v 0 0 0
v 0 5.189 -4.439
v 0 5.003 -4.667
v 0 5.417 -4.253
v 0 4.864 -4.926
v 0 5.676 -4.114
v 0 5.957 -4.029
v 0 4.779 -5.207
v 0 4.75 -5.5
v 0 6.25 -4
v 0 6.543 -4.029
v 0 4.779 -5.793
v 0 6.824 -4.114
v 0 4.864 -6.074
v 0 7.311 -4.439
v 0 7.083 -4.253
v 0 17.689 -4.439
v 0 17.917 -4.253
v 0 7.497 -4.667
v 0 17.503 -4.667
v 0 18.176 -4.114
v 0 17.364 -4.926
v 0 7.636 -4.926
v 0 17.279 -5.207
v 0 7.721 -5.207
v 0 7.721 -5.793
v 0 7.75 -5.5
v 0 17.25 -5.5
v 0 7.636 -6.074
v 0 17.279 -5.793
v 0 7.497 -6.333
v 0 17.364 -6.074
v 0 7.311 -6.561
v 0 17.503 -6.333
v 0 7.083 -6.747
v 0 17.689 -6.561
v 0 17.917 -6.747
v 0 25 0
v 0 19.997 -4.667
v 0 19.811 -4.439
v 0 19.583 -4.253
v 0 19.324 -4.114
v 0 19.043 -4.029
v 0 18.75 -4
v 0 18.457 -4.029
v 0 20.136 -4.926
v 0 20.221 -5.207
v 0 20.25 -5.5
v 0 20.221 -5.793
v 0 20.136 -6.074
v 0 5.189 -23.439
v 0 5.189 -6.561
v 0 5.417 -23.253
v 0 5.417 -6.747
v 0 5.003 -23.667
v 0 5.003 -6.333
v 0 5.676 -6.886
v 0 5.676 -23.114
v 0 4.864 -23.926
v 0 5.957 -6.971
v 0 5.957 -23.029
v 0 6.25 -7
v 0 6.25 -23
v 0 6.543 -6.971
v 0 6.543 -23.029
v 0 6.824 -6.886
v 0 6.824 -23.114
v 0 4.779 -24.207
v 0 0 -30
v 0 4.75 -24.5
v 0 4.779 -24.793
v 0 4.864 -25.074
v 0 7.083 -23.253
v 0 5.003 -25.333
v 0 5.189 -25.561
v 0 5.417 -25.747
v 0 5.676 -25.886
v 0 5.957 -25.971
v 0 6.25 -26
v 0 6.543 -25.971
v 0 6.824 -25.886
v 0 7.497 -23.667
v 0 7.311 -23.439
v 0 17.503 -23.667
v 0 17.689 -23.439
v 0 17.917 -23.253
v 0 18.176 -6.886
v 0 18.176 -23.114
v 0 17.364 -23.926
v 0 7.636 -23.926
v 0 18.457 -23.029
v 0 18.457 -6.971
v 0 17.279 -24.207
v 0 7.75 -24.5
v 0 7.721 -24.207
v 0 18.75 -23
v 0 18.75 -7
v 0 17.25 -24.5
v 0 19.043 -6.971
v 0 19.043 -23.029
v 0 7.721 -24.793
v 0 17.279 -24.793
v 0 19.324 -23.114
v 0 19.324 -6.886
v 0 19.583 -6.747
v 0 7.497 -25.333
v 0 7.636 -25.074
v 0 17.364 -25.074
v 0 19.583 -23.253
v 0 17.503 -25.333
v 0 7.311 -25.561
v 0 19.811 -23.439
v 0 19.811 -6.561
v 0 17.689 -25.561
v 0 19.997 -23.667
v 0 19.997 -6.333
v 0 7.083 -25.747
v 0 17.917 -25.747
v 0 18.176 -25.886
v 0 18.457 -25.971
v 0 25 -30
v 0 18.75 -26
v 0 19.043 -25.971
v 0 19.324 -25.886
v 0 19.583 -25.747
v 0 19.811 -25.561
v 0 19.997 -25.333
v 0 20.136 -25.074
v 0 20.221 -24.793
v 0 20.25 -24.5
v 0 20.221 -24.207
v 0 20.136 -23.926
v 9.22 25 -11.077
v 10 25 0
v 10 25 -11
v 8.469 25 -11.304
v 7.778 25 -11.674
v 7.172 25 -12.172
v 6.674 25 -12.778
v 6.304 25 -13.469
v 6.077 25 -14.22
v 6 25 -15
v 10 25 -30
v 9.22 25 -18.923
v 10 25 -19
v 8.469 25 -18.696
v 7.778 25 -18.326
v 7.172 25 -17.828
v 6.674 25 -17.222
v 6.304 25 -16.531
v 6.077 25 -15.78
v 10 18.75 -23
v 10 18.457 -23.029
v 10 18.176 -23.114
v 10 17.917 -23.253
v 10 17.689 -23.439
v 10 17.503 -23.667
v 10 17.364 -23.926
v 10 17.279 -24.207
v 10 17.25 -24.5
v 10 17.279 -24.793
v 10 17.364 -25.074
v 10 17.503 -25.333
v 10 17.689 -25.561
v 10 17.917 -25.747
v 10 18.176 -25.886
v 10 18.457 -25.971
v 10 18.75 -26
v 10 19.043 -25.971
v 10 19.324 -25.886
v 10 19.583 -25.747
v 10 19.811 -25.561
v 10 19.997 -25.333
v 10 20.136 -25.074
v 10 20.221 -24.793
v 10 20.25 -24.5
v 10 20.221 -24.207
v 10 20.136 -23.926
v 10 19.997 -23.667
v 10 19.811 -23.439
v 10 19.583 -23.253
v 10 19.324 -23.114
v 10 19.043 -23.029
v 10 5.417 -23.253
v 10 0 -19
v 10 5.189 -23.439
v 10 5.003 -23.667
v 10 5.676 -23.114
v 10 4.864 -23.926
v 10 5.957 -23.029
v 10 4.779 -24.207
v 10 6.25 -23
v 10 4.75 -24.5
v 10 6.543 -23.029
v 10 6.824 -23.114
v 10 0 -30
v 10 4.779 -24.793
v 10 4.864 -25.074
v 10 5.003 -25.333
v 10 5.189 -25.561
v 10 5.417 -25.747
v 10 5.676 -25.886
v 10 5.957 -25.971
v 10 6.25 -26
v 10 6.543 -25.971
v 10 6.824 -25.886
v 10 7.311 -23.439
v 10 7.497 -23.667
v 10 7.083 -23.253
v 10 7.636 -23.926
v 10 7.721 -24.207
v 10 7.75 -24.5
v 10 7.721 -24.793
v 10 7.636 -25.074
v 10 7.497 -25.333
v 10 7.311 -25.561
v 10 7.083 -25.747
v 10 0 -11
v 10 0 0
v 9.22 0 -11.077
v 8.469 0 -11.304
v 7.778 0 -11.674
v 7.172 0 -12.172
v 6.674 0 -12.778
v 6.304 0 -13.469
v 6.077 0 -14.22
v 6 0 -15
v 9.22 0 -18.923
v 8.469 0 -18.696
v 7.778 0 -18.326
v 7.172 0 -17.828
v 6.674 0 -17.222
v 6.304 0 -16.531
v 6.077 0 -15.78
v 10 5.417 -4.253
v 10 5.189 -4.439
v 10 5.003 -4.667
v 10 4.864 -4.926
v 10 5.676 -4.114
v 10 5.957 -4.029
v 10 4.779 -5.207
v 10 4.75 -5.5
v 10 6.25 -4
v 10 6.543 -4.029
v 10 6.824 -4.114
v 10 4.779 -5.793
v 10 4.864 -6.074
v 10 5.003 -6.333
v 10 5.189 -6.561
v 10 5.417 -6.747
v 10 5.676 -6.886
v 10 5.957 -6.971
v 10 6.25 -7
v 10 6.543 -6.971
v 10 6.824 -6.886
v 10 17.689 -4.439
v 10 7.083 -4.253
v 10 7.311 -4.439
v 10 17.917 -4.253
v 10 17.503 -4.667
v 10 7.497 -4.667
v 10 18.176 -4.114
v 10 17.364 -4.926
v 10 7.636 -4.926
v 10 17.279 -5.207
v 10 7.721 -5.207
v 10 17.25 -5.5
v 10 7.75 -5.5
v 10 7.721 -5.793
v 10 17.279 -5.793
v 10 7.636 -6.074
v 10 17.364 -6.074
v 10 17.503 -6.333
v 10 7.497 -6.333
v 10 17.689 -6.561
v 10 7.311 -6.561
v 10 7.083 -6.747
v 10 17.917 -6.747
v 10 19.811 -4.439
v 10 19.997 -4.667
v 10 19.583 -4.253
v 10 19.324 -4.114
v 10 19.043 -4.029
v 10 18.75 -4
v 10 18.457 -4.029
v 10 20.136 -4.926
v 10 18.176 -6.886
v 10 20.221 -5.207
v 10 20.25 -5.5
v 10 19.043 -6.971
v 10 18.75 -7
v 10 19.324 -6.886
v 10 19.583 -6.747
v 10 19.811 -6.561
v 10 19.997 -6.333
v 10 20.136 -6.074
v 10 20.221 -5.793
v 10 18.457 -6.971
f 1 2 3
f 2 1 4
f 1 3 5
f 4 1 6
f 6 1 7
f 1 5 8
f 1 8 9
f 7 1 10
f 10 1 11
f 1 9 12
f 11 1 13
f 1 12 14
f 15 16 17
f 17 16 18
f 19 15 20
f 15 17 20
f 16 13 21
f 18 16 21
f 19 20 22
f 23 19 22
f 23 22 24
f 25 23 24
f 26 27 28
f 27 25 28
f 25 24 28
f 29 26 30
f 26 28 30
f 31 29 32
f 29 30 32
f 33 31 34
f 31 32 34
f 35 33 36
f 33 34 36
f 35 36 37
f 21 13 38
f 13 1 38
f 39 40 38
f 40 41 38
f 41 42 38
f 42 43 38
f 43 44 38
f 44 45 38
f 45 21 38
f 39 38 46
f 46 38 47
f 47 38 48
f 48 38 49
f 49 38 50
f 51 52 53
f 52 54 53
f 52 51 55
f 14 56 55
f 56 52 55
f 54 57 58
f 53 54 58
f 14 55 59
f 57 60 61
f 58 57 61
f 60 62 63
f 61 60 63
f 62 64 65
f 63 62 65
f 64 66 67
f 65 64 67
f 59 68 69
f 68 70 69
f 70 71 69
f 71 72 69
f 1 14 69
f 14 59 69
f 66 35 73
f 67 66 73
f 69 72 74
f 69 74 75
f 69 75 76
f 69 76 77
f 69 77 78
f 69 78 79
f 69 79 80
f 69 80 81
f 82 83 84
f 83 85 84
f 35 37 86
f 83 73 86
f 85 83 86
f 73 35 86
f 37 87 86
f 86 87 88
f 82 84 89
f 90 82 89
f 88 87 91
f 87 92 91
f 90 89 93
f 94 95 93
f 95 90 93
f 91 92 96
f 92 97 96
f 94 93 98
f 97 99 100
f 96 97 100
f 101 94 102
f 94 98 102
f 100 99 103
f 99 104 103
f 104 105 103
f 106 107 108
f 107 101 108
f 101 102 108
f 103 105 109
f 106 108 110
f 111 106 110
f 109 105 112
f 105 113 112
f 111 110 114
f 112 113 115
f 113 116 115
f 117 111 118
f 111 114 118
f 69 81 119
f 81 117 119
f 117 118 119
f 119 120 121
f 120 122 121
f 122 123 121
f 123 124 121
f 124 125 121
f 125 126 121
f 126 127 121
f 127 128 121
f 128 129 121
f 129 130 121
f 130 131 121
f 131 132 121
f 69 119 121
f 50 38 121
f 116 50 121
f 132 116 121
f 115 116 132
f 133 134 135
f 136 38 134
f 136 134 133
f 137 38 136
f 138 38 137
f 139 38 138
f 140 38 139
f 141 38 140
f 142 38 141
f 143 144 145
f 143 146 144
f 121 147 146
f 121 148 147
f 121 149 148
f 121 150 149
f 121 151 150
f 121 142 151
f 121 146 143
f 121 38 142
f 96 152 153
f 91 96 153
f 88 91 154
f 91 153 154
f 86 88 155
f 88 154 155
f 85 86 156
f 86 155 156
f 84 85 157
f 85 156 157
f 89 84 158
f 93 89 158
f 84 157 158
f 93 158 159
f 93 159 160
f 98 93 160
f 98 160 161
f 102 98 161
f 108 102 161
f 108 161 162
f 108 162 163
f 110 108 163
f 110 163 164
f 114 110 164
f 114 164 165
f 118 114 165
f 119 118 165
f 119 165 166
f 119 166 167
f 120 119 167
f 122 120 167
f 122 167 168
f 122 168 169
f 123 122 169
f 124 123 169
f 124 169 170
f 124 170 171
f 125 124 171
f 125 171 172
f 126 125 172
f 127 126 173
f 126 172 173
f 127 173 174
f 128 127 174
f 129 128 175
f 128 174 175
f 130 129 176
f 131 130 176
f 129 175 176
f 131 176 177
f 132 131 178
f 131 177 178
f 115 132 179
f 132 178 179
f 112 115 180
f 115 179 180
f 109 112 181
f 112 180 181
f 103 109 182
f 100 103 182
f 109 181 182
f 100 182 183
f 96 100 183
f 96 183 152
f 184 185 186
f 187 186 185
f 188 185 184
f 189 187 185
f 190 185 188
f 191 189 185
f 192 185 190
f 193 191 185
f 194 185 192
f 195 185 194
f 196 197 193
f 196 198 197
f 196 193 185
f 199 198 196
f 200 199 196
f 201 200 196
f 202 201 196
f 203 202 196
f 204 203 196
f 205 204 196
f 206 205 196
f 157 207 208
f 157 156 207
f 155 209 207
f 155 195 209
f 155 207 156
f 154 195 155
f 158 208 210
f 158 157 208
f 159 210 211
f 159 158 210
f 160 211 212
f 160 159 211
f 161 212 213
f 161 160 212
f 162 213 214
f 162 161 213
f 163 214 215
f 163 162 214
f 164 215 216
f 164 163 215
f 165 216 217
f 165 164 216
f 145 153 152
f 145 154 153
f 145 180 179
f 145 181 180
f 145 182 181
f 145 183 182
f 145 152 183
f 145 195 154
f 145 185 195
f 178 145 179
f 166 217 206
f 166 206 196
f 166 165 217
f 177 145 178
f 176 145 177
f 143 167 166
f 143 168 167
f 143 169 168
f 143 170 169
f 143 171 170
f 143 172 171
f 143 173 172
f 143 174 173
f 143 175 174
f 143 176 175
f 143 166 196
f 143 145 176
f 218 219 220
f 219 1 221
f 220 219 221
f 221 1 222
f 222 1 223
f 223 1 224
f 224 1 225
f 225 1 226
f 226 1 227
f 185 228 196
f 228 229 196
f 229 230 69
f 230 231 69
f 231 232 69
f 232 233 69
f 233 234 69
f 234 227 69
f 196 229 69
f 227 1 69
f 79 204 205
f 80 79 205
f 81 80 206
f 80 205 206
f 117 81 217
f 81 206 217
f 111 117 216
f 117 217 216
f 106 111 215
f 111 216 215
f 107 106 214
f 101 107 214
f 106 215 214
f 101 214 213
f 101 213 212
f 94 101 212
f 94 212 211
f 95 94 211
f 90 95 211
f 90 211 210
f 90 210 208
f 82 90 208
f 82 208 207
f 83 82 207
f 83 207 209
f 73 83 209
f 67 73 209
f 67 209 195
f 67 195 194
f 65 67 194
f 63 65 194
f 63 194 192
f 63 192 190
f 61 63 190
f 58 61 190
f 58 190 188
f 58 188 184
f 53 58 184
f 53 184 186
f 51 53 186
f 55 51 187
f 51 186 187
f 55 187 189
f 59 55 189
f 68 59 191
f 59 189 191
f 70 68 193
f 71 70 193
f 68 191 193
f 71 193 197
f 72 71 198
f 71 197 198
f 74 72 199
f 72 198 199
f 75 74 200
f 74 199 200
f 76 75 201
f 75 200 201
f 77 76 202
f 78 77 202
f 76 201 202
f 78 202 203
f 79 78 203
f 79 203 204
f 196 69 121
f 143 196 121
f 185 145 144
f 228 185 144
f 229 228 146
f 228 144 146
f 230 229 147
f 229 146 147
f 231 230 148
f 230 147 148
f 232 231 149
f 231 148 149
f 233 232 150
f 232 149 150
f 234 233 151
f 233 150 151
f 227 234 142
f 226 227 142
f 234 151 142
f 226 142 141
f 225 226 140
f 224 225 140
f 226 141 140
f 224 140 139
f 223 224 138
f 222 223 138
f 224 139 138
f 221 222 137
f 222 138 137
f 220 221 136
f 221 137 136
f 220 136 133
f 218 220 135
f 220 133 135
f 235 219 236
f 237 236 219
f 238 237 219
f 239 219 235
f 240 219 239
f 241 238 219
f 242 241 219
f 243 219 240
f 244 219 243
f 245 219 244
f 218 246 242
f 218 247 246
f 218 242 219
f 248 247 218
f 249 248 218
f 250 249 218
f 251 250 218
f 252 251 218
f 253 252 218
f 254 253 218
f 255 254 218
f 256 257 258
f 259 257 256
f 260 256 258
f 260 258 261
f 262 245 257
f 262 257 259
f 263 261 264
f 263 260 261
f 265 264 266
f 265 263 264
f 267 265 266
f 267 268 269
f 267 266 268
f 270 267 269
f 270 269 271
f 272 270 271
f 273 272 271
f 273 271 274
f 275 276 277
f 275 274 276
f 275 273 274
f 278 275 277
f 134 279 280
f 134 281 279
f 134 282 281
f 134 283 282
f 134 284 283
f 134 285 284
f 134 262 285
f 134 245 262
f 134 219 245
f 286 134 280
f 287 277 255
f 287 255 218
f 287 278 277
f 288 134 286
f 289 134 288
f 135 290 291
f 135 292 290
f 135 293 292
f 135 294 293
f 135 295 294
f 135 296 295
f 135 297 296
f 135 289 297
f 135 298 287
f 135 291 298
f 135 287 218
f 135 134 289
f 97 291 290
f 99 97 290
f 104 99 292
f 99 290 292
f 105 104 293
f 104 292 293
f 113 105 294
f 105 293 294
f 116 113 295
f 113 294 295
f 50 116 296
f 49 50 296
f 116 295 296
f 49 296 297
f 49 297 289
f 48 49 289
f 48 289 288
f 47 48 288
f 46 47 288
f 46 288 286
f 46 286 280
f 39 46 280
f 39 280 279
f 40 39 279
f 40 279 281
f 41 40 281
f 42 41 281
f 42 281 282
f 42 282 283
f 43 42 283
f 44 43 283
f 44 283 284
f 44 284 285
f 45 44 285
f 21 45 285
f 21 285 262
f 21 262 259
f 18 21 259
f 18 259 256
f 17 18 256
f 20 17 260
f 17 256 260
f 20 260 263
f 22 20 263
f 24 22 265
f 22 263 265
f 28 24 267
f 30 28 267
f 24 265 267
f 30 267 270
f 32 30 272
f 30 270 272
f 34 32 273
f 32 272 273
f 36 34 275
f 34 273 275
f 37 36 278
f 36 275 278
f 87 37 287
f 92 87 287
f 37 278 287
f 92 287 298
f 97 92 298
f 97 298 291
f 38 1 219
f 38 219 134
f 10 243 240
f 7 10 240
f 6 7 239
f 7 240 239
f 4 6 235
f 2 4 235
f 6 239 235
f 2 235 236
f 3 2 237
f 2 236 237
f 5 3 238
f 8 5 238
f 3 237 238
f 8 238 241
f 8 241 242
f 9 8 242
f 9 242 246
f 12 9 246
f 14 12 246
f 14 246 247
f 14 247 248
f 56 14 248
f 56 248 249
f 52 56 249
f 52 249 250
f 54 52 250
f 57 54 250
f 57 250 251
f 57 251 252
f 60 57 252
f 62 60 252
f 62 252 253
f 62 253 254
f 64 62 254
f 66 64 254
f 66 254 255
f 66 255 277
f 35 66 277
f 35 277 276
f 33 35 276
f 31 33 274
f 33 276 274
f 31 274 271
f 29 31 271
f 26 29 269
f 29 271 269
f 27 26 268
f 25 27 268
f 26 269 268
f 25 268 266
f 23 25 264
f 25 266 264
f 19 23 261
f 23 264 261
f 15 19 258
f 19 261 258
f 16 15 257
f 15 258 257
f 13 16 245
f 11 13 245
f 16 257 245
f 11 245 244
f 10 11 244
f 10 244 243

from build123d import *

# Parameters (mm, degrees)
SKETCH_1_W          = 30
SKETCH_1_H          = 25
EXTRUDE_1_DEPTH     = 10
SKETCH_2_R          = 4
CUT_EXTRUDE_1_DEPTH = 41.311288741
SKETCH_3_R          = 1.5
CUT_EXTRUDE_2_DEPTH = 41.311288741


with BuildPart() as part:
    # 스케치1 → 보스-돌출1 (new body)
    with BuildSketch(Plane(origin=(0, 0, 0), x_dir=(0, 0, -1), z_dir=(1, 0, 0))):
        with Locations((15, 12.5)):
            Rectangle(SKETCH_1_W, SKETCH_1_H)
    extrude(amount=EXTRUDE_1_DEPTH)

    # 스케치2 → 컷-돌출1 (cut, through all)
    with BuildSketch(Plane(origin=(0, 25, 0), x_dir=(1, 0, 0), z_dir=(0, 1, 0))):
        with Locations((10, 15)):
            Circle(SKETCH_2_R)
    extrude(amount=-CUT_EXTRUDE_1_DEPTH, mode=Mode.SUBTRACT)

    # 스케치3 → 컷-돌출2 (cut, through all)
    with BuildSketch(Plane(origin=(10, 0, 0), x_dir=(0, 0, -1), z_dir=(1, 0, 0))):
        with Locations((5.5, 18.75)):
            Circle(SKETCH_3_R)
        with Locations(Location((24.5, 18.75, 0), (0, 0, 180))):
            Circle(SKETCH_3_R)
        with Locations(Location((5.5, 6.25, 0), (0, 0, 180))):
            Circle(SKETCH_3_R)
        with Locations((24.5, 6.25)):
            Circle(SKETCH_3_R)
    extrude(amount=-CUT_EXTRUDE_2_DEPTH, mode=Mode.SUBTRACT)


solid = part.part
